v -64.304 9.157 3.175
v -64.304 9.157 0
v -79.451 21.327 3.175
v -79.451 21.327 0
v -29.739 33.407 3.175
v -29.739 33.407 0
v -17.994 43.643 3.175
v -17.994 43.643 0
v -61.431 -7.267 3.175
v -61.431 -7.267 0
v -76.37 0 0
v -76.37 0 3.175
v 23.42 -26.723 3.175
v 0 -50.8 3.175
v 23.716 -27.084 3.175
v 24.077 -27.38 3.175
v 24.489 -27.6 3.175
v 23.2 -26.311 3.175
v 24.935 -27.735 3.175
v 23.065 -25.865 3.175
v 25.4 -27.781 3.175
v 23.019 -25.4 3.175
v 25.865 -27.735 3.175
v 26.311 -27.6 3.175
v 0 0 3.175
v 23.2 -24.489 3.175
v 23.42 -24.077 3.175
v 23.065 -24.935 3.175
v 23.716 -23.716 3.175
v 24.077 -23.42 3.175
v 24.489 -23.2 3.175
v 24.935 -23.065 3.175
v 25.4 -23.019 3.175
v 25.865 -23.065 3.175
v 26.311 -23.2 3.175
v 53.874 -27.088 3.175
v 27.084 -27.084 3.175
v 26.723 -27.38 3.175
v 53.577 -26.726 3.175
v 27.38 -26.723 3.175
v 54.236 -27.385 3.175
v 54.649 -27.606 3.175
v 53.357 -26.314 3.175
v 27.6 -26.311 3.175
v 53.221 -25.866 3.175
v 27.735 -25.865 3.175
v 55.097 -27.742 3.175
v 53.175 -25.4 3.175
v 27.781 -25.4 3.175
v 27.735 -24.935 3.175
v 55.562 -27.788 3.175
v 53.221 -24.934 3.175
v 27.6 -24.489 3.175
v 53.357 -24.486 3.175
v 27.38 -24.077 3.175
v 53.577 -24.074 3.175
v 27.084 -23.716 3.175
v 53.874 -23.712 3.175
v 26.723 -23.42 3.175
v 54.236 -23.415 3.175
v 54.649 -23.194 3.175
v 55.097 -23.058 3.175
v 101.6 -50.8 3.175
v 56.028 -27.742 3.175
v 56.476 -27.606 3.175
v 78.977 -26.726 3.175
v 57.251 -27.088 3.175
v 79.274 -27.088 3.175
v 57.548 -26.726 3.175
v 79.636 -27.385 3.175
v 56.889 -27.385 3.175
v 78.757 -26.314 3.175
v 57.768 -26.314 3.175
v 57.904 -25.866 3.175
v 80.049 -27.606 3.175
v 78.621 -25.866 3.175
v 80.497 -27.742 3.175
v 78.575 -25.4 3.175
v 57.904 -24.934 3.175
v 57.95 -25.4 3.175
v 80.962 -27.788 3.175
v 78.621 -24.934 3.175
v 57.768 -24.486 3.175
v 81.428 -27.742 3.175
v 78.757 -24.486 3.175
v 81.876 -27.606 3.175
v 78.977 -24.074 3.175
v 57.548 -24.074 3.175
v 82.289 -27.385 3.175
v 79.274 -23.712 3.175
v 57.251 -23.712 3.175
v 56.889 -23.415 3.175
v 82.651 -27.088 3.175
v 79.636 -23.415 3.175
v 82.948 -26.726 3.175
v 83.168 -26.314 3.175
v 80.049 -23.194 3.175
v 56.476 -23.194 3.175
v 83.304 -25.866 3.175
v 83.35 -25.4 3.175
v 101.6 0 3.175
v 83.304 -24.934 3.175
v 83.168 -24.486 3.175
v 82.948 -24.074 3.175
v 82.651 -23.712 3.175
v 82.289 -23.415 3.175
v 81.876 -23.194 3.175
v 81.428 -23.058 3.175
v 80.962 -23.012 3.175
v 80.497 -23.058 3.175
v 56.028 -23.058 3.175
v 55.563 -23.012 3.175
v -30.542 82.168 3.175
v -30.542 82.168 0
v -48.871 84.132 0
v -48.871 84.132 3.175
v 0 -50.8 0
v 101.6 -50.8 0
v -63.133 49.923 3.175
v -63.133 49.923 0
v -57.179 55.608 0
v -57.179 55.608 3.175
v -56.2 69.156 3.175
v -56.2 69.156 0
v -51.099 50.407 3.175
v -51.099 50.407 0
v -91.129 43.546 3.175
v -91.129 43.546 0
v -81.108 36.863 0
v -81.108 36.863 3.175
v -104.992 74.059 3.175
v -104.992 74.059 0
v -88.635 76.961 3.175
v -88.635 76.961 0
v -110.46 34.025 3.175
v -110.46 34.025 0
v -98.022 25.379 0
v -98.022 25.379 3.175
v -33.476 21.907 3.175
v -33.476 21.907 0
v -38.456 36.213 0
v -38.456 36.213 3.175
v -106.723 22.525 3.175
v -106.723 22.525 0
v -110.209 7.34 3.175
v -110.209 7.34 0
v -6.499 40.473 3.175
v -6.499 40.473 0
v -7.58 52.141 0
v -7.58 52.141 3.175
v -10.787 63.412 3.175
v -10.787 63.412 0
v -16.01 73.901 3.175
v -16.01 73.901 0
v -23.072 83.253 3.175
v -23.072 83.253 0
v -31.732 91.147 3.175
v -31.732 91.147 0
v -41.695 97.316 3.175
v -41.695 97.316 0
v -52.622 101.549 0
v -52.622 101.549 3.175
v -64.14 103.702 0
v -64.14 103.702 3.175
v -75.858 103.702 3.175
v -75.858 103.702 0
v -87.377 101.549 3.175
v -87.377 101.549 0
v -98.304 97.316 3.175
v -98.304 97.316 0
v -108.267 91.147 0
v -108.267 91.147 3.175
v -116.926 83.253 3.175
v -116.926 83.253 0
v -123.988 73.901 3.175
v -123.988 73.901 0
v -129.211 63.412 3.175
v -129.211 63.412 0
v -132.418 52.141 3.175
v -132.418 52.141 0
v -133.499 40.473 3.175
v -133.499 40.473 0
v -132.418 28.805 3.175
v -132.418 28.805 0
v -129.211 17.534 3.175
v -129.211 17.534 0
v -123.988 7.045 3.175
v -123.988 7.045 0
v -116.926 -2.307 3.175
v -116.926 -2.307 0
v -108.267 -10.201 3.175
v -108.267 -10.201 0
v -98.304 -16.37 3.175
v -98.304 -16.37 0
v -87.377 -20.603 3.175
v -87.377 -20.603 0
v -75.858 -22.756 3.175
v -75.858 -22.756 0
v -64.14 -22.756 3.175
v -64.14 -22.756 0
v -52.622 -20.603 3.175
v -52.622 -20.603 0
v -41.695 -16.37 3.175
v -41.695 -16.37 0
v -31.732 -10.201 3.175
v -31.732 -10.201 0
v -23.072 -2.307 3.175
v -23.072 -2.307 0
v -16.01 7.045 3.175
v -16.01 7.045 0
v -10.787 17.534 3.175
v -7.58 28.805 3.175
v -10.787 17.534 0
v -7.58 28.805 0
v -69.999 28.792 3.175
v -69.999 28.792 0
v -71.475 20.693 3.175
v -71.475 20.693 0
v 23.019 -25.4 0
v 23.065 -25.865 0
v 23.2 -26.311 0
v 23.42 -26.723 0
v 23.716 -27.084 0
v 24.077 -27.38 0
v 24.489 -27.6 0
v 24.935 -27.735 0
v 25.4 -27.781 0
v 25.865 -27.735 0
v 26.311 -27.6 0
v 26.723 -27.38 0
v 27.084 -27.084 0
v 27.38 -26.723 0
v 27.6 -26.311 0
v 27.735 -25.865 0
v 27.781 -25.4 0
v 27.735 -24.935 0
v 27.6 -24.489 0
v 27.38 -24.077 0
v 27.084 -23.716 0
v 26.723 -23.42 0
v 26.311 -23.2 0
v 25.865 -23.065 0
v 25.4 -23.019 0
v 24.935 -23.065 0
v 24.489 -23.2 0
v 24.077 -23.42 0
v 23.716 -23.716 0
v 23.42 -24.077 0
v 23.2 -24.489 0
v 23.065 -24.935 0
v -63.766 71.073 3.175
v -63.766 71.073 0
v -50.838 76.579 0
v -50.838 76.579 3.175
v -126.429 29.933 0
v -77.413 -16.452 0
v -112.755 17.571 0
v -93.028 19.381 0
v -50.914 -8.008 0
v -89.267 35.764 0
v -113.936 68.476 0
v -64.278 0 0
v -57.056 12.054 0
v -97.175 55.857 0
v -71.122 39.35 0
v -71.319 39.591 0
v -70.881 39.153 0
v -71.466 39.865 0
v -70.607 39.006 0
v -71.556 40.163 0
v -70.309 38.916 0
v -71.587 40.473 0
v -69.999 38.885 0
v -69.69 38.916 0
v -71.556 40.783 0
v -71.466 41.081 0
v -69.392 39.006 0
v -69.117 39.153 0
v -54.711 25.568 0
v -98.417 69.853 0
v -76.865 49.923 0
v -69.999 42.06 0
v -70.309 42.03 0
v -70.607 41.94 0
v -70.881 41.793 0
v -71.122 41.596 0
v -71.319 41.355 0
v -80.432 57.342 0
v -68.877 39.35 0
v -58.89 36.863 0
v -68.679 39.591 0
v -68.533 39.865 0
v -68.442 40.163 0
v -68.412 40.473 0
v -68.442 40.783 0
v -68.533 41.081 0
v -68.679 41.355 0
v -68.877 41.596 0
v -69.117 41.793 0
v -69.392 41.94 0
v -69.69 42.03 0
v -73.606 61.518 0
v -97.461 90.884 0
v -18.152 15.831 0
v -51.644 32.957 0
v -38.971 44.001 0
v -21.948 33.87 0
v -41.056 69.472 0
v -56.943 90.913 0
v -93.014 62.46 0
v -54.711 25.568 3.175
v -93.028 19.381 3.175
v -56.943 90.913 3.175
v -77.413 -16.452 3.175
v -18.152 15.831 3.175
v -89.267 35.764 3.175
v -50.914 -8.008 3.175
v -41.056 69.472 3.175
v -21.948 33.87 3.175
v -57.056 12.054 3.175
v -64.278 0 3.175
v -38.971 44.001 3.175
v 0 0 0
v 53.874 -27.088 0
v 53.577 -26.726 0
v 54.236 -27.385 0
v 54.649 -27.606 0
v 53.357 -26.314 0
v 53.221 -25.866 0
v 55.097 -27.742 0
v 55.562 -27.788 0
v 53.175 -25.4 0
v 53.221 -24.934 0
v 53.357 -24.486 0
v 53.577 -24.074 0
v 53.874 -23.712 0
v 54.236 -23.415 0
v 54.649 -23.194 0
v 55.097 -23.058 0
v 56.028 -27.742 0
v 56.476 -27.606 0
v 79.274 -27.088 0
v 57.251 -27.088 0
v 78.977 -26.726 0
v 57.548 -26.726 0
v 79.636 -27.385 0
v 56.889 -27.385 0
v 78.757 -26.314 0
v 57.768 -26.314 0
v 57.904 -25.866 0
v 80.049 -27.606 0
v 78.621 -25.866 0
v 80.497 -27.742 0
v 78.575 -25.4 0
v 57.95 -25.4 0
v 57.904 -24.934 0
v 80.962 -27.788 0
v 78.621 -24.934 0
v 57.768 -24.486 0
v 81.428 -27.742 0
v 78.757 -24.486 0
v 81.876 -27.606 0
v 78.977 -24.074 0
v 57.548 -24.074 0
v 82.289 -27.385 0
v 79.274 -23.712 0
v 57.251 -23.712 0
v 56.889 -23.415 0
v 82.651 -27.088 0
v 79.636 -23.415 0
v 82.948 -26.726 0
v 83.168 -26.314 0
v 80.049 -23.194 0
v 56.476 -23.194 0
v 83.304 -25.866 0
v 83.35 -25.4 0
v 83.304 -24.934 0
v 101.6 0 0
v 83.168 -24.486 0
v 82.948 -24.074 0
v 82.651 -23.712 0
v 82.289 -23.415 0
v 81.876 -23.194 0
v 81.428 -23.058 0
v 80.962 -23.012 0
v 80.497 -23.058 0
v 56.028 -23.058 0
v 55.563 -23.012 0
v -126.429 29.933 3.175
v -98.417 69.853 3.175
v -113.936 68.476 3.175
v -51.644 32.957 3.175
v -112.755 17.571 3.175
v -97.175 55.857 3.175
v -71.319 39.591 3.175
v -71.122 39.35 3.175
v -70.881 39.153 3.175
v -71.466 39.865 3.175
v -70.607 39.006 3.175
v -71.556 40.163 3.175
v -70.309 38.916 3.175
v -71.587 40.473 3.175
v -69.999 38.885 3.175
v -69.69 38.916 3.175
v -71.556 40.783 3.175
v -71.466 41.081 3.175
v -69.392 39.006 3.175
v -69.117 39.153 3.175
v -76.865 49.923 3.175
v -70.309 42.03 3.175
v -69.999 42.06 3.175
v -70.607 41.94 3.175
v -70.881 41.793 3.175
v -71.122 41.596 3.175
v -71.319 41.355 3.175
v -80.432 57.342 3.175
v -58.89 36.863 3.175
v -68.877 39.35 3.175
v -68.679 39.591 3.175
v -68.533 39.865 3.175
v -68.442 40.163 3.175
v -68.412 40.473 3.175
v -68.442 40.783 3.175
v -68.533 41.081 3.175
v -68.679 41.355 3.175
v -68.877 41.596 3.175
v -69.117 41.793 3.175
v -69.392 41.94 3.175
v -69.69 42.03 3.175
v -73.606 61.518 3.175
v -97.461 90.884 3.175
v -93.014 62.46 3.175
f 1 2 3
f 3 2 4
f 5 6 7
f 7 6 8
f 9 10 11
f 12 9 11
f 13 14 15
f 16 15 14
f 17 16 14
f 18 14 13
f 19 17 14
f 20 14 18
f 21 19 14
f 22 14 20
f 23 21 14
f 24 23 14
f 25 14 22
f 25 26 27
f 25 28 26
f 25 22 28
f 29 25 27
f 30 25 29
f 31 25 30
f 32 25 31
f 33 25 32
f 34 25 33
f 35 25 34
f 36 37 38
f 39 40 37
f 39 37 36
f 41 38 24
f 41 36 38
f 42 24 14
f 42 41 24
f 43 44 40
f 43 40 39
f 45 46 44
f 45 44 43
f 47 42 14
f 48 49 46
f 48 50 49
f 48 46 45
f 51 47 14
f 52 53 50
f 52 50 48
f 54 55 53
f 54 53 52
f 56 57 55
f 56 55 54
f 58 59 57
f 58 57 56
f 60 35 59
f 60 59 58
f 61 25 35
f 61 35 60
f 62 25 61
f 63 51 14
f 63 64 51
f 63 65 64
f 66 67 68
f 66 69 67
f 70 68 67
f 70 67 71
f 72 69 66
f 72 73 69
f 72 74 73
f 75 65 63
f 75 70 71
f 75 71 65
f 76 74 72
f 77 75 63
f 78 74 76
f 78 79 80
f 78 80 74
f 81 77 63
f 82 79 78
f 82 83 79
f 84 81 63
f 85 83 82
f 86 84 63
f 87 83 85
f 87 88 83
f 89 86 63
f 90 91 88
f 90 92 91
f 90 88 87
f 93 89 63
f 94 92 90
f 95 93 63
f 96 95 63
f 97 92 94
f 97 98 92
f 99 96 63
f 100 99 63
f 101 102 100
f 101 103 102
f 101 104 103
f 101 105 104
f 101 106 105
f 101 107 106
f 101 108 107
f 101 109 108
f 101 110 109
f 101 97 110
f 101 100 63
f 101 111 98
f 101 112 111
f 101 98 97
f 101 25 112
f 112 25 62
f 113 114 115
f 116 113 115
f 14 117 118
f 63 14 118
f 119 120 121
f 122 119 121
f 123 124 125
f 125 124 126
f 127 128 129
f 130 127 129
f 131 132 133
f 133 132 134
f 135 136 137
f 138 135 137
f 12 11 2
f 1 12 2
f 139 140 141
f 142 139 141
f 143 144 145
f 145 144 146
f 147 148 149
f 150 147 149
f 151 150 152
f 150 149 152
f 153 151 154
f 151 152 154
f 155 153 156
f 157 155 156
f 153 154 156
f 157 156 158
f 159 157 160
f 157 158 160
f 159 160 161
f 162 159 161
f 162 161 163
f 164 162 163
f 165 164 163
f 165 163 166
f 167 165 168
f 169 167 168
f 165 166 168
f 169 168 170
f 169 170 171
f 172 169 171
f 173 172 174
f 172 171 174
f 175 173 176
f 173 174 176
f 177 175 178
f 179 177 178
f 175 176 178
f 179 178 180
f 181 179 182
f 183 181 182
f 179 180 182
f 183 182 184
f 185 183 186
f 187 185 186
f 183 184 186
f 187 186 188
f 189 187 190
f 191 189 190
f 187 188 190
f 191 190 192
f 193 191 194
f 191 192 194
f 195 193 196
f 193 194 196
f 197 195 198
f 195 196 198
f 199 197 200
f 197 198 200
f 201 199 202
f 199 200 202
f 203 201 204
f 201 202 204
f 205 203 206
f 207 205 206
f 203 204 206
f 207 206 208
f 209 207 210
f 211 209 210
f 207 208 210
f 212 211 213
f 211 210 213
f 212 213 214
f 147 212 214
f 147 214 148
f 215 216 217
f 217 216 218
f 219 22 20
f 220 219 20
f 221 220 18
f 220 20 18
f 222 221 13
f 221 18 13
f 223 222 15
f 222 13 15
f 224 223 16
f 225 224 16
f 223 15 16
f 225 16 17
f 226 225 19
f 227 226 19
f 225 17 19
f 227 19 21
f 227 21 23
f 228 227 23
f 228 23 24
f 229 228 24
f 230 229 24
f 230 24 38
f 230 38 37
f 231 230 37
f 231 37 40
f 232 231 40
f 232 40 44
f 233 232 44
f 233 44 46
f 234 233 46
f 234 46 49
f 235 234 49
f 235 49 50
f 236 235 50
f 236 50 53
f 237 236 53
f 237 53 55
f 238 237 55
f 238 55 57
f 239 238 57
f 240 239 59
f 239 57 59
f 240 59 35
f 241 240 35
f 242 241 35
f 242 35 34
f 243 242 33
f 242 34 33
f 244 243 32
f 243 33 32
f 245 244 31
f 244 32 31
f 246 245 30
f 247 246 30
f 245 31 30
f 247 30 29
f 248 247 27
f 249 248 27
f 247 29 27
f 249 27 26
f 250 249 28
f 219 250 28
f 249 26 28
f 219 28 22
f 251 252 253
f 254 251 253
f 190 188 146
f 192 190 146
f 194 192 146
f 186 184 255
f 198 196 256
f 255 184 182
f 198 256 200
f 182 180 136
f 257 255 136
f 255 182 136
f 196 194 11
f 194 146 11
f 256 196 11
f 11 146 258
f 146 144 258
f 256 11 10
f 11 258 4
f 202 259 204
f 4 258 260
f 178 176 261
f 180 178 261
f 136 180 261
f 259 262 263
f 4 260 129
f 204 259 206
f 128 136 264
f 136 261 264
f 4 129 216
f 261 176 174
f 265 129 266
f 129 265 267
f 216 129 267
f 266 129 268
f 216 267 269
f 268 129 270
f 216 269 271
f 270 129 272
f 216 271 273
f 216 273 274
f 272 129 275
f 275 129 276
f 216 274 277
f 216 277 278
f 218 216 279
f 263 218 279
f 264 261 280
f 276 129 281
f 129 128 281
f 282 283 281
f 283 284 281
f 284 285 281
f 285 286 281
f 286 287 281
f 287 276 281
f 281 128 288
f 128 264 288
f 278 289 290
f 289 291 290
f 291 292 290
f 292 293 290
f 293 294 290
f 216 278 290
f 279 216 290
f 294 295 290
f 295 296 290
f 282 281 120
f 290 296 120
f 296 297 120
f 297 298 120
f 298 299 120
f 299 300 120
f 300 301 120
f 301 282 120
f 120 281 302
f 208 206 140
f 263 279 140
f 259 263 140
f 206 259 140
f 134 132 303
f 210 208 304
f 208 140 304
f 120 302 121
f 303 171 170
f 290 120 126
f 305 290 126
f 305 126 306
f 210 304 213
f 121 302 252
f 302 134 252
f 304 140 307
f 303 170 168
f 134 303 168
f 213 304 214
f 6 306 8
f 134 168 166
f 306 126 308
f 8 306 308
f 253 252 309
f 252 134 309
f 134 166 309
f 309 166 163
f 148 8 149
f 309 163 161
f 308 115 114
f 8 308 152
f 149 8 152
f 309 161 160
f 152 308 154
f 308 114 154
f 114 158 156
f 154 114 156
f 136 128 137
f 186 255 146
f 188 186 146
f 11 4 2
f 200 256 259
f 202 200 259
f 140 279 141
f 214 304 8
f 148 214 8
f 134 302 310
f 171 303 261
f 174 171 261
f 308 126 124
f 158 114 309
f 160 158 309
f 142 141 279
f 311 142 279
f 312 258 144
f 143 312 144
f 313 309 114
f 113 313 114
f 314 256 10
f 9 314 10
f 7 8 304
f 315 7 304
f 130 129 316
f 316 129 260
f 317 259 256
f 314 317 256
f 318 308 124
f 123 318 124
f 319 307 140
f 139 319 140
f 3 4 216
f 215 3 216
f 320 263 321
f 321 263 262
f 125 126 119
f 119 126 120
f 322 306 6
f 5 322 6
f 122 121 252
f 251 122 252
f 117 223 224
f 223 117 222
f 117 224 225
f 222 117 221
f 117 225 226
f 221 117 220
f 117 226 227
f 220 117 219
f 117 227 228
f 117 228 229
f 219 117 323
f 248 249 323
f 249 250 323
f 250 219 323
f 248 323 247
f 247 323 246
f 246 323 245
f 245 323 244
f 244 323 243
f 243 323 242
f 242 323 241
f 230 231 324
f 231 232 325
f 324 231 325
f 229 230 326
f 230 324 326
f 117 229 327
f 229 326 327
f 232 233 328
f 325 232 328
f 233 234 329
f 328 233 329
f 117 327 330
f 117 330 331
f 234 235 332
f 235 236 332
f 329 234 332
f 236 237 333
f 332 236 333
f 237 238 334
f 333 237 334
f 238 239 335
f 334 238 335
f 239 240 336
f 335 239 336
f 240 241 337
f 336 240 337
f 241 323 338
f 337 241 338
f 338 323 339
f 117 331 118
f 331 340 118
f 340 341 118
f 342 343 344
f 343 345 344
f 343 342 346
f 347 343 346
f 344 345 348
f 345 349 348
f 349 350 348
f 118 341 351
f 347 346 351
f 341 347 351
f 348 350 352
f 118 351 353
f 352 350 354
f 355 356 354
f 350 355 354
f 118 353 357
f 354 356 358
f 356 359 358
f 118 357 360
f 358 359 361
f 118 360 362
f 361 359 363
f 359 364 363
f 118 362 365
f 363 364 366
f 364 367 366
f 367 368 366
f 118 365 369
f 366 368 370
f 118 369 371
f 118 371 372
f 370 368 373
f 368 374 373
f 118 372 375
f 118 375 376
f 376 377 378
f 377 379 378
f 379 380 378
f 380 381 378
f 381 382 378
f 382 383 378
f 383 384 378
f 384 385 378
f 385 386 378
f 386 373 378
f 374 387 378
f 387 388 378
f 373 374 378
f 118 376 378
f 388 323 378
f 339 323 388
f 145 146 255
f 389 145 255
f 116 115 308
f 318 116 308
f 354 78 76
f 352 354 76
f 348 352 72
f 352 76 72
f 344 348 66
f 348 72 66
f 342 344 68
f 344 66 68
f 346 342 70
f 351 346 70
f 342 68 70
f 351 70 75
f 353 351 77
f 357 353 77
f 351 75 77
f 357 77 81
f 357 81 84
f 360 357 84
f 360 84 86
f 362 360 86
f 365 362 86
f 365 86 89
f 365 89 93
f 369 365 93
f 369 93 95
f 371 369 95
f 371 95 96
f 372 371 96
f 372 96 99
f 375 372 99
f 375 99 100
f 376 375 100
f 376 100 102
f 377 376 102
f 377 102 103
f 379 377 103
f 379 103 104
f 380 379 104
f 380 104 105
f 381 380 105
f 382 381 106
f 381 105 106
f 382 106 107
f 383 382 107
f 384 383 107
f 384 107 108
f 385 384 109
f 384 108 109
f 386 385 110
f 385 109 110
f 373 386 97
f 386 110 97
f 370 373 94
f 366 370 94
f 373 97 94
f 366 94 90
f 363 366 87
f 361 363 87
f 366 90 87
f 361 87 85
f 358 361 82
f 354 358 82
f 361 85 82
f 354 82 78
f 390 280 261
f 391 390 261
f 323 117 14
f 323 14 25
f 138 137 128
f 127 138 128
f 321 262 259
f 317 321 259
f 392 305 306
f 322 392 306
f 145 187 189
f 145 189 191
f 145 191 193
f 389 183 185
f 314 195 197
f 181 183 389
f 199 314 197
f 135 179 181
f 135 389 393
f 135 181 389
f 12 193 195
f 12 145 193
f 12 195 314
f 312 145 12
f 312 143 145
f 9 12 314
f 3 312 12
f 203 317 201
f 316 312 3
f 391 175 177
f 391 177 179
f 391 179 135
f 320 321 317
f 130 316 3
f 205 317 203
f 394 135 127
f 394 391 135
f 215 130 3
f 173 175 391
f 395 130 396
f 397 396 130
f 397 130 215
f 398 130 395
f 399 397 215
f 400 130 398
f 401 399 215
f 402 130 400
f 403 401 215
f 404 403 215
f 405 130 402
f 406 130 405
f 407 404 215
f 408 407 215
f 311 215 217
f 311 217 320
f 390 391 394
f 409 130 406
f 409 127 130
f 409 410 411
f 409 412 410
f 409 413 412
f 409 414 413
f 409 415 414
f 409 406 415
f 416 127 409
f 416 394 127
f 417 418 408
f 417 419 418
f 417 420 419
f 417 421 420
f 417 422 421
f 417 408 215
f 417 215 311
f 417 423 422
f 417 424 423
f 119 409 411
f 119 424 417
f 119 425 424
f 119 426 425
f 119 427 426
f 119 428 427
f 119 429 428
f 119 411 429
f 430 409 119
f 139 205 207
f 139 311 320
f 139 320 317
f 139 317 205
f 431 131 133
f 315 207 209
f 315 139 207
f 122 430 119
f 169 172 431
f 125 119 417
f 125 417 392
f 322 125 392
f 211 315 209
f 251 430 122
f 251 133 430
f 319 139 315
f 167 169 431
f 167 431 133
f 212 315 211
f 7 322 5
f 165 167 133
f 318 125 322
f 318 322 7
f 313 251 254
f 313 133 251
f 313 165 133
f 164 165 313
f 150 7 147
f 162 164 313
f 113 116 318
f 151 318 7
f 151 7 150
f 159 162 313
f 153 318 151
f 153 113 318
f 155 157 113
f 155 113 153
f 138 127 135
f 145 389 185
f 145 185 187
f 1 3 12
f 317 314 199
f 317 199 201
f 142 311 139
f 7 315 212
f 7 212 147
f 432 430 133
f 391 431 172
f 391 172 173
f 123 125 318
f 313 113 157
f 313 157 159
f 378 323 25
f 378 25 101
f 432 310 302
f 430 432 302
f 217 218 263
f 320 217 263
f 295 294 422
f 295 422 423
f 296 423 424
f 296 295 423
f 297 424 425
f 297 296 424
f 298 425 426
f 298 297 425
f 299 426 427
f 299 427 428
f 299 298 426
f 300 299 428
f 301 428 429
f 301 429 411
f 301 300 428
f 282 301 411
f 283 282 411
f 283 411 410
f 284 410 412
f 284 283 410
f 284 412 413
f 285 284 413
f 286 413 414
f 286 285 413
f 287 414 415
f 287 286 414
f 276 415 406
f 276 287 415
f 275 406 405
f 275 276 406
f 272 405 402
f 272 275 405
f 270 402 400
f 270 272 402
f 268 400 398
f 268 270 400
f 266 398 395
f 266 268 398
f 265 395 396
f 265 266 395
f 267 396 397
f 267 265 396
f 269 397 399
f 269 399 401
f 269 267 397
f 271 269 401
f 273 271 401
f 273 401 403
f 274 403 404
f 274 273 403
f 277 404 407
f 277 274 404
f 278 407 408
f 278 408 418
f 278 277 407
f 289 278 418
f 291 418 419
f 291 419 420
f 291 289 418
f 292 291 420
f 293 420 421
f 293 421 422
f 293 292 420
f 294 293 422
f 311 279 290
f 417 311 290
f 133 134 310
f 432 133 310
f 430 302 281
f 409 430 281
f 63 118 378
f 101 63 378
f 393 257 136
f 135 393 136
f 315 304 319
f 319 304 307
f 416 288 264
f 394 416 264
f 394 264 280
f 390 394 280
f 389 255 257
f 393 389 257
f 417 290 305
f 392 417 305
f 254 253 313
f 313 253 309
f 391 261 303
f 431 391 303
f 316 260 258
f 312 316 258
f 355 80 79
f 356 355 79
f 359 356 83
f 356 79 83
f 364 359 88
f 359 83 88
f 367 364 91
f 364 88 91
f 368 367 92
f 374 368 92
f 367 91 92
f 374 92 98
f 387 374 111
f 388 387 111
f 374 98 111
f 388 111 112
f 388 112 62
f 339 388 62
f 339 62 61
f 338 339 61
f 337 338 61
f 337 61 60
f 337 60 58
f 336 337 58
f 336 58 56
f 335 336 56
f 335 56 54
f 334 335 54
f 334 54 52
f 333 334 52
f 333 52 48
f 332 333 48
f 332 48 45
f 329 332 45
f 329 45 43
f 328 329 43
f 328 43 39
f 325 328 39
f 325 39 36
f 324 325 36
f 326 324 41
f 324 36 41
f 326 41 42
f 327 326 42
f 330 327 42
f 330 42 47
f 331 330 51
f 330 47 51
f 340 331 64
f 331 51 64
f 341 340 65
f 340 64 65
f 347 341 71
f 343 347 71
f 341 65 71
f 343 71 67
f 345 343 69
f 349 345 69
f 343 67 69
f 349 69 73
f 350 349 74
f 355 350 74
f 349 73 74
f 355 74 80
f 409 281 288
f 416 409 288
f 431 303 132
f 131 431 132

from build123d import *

# Parameters (mm, degrees)
F0_W     = 101.6
F0_H     = 50.8
F1_DEPTH = 3.175
F3_DEPTH = 3.176
F5_R     = 63.5
F5_R_2   = 1.5875
F6_DEPTH = 3.175


# Not quite as in the source:
# - a length typed as a fraction of an inch, garbled in the dataset ("3 / 203.2 mm" for 3/8 in), is restored


with BuildPart() as f1:
    # F0 (on Top) → F1 (new body)
    with BuildSketch(Plane.XY):
        with Locations((50.8, -25.4)):
            Rectangle(F0_W, F0_H)
    extrude(amount=F1_DEPTH)

    # F2 (on face) → F3 (cut, through all)
    with BuildSketch(Plane.XY.offset(3.175)):
        with BuildLine():
            ThreePointArc((27.78125, -25.4), (25.4, -23.01875), (23.01875, -25.4))
            Line((23.01875, -25.4), (25.4, -25.4))
            Line((25.4, -25.4), (27.78125, -25.4))
        make_face()
        with BuildLine():
            Line((25.4, -25.4), (23.01875, -25.4))
            ThreePointArc((23.01875, -25.4), (25.4, -27.78125), (27.78125, -25.4))
            Line((27.78125, -25.4), (25.4, -25.4))
        make_face()
        with BuildLine():
            Line((55.5625, -25.4), (53.1749, -25.4))
            ThreePointArc((53.1749, -25.4), (55.5625, -27.7876), (57.9501, -25.4))
            Line((57.9501, -25.4), (55.5625, -25.4))
        make_face()
        with BuildLine():
            ThreePointArc((57.9501, -25.4), (55.5625, -23.0124), (53.1749, -25.4))
            Line((53.1749, -25.4), (55.5625, -25.4))
            Line((55.5625, -25.4), (57.9501, -25.4))
        make_face()
        with BuildLine():
            ThreePointArc((83.3501, -25.4), (80.9625, -23.0124), (78.5749, -25.4))
            ThreePointArc((78.5749, -25.4), (80.9625, -27.7876), (83.3501, -25.4))
        make_face()
    extrude(amount=-F3_DEPTH, mode=Mode.SUBTRACT)


with BuildPart() as f6:
    # F5 (on Top) → F6 (new body)
    with BuildSketch(Plane.XY):
        with Locations((-69.9992328882, 40.4729917645)):
            Circle(F5_R)
        Polygon((-91.1287275403, 43.5456714677), (-81.1082634294, 36.8634489357), (-89.266684788, 35.7642112787), (-93.0278924051, 19.3807095608), (-106.7233378314, 22.5248123628), (-110.209272308, 7.3403771227), (-126.4287452471, 29.9333454927), (-112.7548140407, 17.5712748797), (-110.4600478416, 34.0252232445), (-98.0220682083, 25.3789987215), align=None, mode=Mode.SUBTRACT)
        Polygon((-79.4508978724, 21.3271584362), (-69.9992328882, 28.7922658026), (-71.4748865987, 20.6934628899), (-57.0555276033, 12.0535614183), (-64.2778724432, 0), (-50.9138293564, -8.0075692385), (-77.4131119251, -16.4515934885), (-61.4306069911, -7.2670020163), (-76.3701200485, 0), (-64.3035247922, 9.157391265), align=None, mode=Mode.SUBTRACT)
        Polygon((-54.7111884466, 25.5675363215), (-58.8902023471, 36.8634489357), (-51.6437851371, 32.9573511244), (-38.9709235648, 44.0011000734), (-29.7391327281, 33.4074866294), (-17.9937653968, 43.6429719128), (-18.1517497626, 15.8313095546), (-21.9479496944, 33.8697698701), (-33.4758427384, 21.9070757477), (-38.4562563748, 36.2128793208), align=None, mode=Mode.SUBTRACT)
        Polygon((-73.6063137641, 61.517845586), (-76.8649913447, 49.9228975744), (-80.4315193284, 57.3423342534), (-97.17543247, 55.8566748086), (-98.4173383945, 69.8533986226), (-113.9358074704, 68.4764707828), (-97.4607104577, 90.8837173921), (-104.9922611464, 74.0589461098), (-88.6345045816, 76.9610434321), (-93.0140056732, 62.4599915375), align=None, mode=Mode.SUBTRACT)
        with Locations((-69.9992328882, 40.4729917645)):
            Circle(F5_R_2, mode=Mode.SUBTRACT)
        Polygon((-51.0990368176, 50.4067470113), (-63.1334744317, 49.9228975744), (-57.1792885888, 55.6075992763), (-63.7663883979, 71.0729129616), (-50.8384830438, 76.5792612079), (-56.9434899095, 90.9127082429), (-30.5418470485, 82.1681798718), (-48.8705325686, 84.1319699794), (-41.0556492309, 69.4716163984), (-56.2003093926, 69.1556979779), align=None, mode=Mode.SUBTRACT)
    extrude(amount=F6_DEPTH)


solid = Compound([f1.part, f6.part])
